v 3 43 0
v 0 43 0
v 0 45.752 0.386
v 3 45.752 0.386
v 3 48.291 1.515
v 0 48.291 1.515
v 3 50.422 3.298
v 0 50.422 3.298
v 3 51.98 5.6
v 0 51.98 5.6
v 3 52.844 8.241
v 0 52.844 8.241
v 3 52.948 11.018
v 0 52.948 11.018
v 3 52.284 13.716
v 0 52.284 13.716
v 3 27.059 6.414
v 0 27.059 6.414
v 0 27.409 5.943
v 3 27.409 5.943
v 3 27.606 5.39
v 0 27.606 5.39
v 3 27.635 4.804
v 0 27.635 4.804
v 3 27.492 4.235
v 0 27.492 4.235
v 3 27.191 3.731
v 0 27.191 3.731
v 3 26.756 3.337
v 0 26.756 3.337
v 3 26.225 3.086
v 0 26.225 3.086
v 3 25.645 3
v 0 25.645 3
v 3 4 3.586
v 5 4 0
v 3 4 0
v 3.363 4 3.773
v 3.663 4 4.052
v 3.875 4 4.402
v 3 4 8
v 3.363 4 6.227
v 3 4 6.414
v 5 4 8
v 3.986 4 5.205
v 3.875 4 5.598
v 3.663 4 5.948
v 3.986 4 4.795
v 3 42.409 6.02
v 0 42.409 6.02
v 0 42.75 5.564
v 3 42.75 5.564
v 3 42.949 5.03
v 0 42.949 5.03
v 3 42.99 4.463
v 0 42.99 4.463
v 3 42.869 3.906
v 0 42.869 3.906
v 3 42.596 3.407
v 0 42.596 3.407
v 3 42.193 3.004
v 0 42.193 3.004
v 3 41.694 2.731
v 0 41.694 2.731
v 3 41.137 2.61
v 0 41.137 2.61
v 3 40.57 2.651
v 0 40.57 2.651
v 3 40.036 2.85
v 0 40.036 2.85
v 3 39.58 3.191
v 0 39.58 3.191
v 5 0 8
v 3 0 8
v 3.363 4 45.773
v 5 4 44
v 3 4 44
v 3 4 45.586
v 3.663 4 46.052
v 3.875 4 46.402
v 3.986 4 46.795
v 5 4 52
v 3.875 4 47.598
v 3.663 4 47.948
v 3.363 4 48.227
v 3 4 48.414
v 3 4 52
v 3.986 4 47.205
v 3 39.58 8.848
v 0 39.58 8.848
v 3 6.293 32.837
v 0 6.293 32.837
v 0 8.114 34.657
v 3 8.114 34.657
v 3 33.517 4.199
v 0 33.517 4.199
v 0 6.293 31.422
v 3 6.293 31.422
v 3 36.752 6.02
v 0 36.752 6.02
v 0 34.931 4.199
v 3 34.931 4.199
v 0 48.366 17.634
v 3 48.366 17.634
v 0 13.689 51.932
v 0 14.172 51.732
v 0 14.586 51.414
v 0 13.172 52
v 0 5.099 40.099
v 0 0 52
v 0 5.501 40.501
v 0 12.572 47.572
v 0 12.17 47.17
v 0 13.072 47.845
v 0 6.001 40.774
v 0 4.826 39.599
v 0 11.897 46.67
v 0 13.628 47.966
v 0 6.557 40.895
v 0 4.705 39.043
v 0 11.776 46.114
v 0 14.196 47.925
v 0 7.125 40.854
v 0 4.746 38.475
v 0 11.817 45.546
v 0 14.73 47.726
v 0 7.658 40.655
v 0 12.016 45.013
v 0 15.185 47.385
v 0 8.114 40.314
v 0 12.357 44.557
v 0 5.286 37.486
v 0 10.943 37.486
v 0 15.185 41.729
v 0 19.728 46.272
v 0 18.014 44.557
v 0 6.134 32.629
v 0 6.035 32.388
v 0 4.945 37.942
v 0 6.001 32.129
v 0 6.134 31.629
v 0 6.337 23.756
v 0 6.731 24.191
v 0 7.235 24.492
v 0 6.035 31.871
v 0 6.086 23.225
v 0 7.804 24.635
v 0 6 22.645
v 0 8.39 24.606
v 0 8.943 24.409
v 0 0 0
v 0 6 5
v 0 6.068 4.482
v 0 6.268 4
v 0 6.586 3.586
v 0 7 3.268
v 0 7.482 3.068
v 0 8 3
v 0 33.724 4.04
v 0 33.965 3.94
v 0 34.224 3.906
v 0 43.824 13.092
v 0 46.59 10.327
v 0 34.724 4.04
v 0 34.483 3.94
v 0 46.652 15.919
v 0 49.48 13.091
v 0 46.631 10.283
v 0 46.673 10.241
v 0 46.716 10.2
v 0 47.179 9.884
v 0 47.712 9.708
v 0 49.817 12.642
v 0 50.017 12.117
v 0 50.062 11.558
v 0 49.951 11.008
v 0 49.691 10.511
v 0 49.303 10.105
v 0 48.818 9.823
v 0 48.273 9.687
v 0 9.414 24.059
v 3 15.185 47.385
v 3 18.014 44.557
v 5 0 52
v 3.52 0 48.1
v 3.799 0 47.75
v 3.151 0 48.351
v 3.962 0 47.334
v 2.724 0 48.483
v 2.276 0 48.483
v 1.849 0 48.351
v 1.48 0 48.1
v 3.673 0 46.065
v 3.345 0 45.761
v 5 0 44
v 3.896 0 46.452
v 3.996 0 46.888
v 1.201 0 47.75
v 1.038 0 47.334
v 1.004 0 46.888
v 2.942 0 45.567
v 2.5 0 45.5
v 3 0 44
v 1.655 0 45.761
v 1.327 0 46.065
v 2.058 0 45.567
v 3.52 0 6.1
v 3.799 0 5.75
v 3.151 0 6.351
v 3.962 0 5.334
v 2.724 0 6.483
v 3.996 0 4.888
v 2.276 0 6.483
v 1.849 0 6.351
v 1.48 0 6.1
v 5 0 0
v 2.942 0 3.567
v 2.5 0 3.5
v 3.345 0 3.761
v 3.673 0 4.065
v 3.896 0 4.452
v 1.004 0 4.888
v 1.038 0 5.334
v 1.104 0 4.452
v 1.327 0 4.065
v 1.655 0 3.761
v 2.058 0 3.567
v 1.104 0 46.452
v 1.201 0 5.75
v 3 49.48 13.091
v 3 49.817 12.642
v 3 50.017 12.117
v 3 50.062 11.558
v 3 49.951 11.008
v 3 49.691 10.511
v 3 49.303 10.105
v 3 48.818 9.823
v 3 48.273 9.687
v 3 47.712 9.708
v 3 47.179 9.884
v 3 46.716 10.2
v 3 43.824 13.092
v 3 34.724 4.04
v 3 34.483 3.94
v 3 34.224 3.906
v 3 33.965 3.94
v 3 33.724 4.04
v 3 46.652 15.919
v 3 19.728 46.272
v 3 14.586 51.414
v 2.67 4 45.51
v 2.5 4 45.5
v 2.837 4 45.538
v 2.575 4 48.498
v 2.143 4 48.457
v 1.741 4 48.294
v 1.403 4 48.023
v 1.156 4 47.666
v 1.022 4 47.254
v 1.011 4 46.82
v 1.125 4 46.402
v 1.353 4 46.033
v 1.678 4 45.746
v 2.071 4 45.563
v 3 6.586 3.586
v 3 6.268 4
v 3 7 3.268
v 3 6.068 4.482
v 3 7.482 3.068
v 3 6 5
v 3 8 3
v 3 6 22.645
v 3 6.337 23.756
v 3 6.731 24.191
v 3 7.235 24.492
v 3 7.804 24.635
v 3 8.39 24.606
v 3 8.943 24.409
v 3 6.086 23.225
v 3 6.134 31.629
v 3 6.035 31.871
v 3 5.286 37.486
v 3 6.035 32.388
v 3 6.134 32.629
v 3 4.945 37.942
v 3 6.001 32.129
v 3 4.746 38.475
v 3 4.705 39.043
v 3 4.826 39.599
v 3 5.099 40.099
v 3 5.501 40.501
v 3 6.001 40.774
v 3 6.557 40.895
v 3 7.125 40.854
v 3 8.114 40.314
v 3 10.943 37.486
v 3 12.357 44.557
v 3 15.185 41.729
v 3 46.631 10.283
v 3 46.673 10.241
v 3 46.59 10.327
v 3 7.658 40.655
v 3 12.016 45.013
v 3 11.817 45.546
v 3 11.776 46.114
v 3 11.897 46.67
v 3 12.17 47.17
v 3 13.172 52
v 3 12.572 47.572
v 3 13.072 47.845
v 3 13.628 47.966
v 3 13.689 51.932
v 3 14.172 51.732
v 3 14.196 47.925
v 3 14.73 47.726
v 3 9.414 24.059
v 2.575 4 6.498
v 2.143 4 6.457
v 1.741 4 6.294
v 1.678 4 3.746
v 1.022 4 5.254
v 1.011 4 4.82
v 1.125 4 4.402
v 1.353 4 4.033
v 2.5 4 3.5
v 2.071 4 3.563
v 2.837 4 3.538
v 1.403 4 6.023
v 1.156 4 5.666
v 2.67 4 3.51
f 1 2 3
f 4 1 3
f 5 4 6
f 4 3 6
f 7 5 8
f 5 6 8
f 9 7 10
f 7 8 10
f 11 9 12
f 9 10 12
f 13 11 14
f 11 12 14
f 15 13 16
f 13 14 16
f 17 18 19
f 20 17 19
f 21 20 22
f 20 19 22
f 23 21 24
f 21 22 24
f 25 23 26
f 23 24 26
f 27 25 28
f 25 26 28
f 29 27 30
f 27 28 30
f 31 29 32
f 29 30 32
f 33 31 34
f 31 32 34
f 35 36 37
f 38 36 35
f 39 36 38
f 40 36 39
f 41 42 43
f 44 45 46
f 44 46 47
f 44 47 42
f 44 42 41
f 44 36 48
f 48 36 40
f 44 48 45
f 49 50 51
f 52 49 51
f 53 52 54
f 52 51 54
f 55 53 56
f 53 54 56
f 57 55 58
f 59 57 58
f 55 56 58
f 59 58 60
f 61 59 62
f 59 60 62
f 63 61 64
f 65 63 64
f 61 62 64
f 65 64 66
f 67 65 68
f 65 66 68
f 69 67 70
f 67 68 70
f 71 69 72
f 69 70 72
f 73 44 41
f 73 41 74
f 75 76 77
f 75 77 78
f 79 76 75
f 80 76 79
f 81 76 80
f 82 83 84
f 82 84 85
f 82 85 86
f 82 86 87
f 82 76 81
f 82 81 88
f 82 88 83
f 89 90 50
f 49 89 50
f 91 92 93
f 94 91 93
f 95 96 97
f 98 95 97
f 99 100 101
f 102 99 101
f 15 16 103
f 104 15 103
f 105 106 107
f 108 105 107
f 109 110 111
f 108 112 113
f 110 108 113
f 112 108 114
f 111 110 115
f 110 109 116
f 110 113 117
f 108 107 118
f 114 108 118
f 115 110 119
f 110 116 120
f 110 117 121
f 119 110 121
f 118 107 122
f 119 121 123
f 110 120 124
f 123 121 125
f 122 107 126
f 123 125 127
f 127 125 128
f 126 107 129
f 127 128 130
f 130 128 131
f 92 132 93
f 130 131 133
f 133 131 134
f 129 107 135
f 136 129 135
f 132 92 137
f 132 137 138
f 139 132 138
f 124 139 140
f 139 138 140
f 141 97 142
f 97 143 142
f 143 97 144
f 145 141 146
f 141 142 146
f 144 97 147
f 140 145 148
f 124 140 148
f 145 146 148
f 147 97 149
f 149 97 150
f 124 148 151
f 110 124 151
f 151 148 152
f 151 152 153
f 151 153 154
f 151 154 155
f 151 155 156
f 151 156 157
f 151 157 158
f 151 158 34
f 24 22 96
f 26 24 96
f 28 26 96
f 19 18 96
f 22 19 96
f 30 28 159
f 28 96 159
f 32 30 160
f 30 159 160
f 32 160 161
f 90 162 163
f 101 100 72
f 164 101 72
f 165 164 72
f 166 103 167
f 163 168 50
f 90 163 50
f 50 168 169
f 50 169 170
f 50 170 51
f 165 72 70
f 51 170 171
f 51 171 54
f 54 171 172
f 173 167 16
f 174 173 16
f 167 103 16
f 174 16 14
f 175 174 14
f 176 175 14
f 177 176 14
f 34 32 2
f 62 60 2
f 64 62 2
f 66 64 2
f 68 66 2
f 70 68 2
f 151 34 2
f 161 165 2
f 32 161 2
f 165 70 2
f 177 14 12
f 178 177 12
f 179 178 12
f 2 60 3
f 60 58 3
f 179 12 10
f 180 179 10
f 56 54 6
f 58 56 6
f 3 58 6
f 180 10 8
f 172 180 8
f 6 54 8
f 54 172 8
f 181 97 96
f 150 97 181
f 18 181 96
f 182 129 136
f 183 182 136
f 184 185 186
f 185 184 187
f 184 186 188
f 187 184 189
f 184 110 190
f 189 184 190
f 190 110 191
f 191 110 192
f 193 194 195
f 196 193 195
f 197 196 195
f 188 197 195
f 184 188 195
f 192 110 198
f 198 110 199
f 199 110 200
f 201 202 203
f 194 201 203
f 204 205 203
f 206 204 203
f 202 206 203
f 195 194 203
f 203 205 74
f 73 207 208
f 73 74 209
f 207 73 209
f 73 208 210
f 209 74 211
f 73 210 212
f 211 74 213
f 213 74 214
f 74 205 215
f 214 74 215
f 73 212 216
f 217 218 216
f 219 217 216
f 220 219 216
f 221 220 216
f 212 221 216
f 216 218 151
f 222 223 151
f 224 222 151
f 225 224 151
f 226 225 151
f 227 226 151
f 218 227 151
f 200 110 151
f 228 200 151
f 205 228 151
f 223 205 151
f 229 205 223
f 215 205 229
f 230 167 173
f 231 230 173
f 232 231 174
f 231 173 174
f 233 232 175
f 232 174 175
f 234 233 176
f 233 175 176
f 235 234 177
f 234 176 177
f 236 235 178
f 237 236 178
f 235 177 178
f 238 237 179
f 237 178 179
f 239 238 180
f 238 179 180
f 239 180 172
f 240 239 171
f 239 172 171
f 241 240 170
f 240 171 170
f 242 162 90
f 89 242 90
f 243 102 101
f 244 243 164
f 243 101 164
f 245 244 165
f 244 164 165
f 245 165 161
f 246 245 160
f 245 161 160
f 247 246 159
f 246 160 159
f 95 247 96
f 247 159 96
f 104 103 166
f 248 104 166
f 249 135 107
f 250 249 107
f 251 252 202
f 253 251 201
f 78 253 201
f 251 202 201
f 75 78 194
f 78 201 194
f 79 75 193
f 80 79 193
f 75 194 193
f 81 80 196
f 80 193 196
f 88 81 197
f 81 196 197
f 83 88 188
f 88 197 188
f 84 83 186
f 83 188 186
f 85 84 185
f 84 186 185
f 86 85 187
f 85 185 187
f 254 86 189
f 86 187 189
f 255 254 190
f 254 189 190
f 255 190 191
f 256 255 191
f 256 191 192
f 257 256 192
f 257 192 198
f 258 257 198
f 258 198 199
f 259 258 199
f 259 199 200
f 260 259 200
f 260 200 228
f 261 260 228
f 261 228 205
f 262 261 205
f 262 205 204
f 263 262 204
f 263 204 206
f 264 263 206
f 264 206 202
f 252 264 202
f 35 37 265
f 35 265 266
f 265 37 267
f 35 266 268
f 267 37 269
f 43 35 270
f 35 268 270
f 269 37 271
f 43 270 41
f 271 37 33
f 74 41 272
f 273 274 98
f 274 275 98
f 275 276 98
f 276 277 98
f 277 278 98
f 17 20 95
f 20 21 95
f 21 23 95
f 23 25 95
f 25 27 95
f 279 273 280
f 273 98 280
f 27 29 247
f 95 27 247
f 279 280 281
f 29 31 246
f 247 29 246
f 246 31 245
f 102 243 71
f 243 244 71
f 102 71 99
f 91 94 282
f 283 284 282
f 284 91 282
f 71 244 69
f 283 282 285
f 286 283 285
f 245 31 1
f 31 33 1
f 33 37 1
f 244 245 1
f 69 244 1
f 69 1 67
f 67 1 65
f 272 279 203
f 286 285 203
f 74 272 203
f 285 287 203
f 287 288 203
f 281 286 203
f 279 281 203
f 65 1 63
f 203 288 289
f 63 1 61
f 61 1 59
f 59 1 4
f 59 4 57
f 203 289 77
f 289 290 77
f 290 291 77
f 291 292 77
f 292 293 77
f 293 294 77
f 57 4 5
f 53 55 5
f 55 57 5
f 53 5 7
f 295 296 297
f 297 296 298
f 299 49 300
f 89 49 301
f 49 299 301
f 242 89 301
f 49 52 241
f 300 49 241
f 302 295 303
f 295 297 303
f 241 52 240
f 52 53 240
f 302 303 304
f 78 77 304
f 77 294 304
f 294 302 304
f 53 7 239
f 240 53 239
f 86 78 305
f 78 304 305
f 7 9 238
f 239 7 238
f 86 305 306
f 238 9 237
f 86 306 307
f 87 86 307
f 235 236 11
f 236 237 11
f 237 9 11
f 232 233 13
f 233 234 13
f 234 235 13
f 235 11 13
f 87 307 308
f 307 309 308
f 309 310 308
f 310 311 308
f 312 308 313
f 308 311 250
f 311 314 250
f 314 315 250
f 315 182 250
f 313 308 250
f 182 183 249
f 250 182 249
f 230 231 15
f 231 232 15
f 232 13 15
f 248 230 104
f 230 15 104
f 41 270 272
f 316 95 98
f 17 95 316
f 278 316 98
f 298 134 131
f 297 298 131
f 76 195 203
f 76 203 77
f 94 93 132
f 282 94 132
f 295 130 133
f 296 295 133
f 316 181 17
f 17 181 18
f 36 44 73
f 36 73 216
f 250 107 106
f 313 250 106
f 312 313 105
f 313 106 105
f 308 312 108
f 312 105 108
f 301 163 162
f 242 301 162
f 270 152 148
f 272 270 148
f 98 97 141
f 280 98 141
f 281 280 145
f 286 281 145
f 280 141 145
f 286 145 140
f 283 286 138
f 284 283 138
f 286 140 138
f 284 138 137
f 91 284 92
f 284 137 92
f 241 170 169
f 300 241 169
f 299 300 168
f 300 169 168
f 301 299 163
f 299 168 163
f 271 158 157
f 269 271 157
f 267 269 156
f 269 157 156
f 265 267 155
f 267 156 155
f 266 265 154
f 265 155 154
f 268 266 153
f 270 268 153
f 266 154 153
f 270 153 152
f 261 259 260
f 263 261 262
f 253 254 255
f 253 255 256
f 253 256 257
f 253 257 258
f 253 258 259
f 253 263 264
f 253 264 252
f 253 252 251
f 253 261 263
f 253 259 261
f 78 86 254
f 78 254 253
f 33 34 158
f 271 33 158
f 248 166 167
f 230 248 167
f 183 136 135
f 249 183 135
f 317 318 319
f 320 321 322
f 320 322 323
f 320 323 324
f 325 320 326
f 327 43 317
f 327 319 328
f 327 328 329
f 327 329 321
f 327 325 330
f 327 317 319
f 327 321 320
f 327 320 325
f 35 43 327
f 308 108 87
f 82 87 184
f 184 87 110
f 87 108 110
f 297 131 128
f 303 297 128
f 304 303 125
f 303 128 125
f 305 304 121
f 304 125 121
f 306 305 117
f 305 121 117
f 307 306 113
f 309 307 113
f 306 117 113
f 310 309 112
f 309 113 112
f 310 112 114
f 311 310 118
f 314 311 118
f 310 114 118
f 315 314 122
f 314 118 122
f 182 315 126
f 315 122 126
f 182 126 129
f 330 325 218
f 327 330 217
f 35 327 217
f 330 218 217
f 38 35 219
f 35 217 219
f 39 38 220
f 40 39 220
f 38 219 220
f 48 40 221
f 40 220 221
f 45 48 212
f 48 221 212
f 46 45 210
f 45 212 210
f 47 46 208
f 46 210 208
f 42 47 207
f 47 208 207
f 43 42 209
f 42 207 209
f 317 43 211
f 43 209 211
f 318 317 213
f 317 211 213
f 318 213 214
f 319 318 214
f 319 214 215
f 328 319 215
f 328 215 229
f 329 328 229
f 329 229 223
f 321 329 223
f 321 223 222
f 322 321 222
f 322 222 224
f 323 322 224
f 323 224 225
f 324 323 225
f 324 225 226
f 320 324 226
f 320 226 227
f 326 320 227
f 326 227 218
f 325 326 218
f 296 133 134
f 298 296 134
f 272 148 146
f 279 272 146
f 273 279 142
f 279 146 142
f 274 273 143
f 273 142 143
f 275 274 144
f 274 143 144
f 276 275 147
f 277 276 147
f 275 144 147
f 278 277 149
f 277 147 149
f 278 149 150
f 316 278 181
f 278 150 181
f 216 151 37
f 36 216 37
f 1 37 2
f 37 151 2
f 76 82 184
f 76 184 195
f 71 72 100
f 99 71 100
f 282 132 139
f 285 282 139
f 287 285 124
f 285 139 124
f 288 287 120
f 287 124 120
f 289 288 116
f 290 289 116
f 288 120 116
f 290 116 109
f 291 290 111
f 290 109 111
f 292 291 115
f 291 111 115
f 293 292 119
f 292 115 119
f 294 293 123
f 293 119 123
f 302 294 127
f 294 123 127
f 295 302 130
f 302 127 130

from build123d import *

# Parameters (mm, degrees)
EXTRUDE_1_DEPTH     = 5
CUT_EXTRUDE_1_DEPTH = 2
SKETCH_3_R          = 1.5
CUT_EXTRUDE_2_DEPTH = 4


with BuildPart() as part:
    # 草图1 → 凸台-拉伸1 (new body)
    with BuildSketch(Plane(origin=(0, 0, 0), x_dir=(0, 0, -1), z_dir=(1, 0, 0))):
        with BuildLine():
            Line((-52, 0), (0, 0))
            Line((0, 0), (0, 43))
            ThreePointArc((0, 43), (-4.394697965, 51.281339813), (-13.716117819, 52.283882181))
            Line((-13.716117819, 52.283882181), (-17.633748237, 48.366251763))
            Line((-17.633748237, 48.366251763), (-15.919029611, 46.651533137))
            Line((-15.919029611, 46.651533137), (-13.090602487, 49.479960262))
            ThreePointArc((-13.090602487, 49.479960262), (-10.294122713, 49.511201687), (-10.200414032, 46.716117819))
            ThreePointArc((-10.200414032, 46.716117819), (-10.262117257, 46.651591245), (-10.32663876, 46.589882717))
            Line((-10.32663876, 46.589882717), (-13.091895354, 43.824398879))
            Line((-13.091895354, 43.824398879), (-8.8479618, 39.580465325))
            Line((-8.8479618, 39.580465325), (-6.019534675, 42.40889245))
            ThreePointArc((-6.019534675, 42.40889245), (-3.19110755, 42.40889245), (-3.19110755, 39.580465325))
            Line((-3.19110755, 39.580465325), (-6.019534675, 36.7520382))
            Line((-6.019534675, 36.7520382), (-4.198719395, 34.93122292))
            ThreePointArc((-4.198719395, 34.93122292), (-3.905826176, 34.224116139), (-4.198719395, 33.517009358))
            Line((-4.198719395, 33.517009358), (-31.42233047, 6.293398282))
            ThreePointArc((-31.42233047, 6.293398282), (-32.129437252, 6.000505063), (-32.836544033, 6.293398282))
            Line((-32.836544033, 6.293398282), (-34.657359313, 8.114213562))
            Line((-34.657359313, 8.114213562), (-37.485786438, 5.285786438))
            ThreePointArc((-37.485786438, 5.285786438), (-40.314213562, 5.285786438), (-40.314213562, 8.114213562))
            Line((-40.314213562, 8.114213562), (-37.485786438, 10.942640687))
            Line((-37.485786438, 10.942640687), (-41.728543336, 15.185397586))
            Line((-41.728543336, 15.185397586), (-44.556796144, 12.356912357))
            ThreePointArc((-44.556796144, 12.356912357), (-47.385252321, 12.356825197), (-47.385281374, 15.185281374))
            Line((-47.385281374, 15.185281374), (-44.556854249, 18.013708499))
            Line((-44.556854249, 18.013708499), (-46.271572875, 19.728427125))
            Line((-46.271572875, 19.728427125), (-51.414213562, 14.585786438))
            ThreePointArc((-51.414213562, 14.585786438), (-51.847759065, 13.93693974), (-52, 13.171572875))
            Line((-52, 13.171572875), (-52, 0))
        make_face()
        with BuildLine():
            Line((-24.058874503, 9.414213562), (-6.414213562, 27.058874503))
            ThreePointArc((-6.414213562, 27.058874503), (-4.234633135, 27.492420006), (-3, 25.644660941))
            Line((-3, 25.644660941), (-3, 8))
            ThreePointArc((-3, 8), (-3.585786438, 6.585786438), (-5, 6))
            Line((-5, 6), (-22.644660941, 6))
            ThreePointArc((-22.644660941, 6), (-24.492420006, 7.234633135), (-24.058874503, 9.414213562))
        make_face(mode=Mode.SUBTRACT)
    extrude(amount=EXTRUDE_1_DEPTH)

    # 草图2 → 切除-拉伸1 (cut)
    with BuildSketch(Plane(origin=(5, 0, 0), x_dir=(0, 0, -1), z_dir=(1, 0, 0))):
        Polygon((9.286430281, 4), (-8, 4), (-8, -3.732330809), (-44, -3.732330809), (-44, 4), (-56.622484713, 4), (-56.622484713, 58.494521895), (9.286430281, 58.494521895), align=None)
    extrude(amount=-CUT_EXTRUDE_1_DEPTH, mode=Mode.SUBTRACT)

    # 草图3 → 切除-拉伸2 (cut)
    with BuildSketch(Plane.XZ):
        with Locations(Location((2.5, 47, 0), (0, 0, 270))):
            Circle(SKETCH_3_R)
        with Locations(Location((2.5, 5, 0), (0, 0, 270))):
            Circle(SKETCH_3_R)
    extrude(amount=-CUT_EXTRUDE_2_DEPTH, mode=Mode.SUBTRACT)


solid = part.part
